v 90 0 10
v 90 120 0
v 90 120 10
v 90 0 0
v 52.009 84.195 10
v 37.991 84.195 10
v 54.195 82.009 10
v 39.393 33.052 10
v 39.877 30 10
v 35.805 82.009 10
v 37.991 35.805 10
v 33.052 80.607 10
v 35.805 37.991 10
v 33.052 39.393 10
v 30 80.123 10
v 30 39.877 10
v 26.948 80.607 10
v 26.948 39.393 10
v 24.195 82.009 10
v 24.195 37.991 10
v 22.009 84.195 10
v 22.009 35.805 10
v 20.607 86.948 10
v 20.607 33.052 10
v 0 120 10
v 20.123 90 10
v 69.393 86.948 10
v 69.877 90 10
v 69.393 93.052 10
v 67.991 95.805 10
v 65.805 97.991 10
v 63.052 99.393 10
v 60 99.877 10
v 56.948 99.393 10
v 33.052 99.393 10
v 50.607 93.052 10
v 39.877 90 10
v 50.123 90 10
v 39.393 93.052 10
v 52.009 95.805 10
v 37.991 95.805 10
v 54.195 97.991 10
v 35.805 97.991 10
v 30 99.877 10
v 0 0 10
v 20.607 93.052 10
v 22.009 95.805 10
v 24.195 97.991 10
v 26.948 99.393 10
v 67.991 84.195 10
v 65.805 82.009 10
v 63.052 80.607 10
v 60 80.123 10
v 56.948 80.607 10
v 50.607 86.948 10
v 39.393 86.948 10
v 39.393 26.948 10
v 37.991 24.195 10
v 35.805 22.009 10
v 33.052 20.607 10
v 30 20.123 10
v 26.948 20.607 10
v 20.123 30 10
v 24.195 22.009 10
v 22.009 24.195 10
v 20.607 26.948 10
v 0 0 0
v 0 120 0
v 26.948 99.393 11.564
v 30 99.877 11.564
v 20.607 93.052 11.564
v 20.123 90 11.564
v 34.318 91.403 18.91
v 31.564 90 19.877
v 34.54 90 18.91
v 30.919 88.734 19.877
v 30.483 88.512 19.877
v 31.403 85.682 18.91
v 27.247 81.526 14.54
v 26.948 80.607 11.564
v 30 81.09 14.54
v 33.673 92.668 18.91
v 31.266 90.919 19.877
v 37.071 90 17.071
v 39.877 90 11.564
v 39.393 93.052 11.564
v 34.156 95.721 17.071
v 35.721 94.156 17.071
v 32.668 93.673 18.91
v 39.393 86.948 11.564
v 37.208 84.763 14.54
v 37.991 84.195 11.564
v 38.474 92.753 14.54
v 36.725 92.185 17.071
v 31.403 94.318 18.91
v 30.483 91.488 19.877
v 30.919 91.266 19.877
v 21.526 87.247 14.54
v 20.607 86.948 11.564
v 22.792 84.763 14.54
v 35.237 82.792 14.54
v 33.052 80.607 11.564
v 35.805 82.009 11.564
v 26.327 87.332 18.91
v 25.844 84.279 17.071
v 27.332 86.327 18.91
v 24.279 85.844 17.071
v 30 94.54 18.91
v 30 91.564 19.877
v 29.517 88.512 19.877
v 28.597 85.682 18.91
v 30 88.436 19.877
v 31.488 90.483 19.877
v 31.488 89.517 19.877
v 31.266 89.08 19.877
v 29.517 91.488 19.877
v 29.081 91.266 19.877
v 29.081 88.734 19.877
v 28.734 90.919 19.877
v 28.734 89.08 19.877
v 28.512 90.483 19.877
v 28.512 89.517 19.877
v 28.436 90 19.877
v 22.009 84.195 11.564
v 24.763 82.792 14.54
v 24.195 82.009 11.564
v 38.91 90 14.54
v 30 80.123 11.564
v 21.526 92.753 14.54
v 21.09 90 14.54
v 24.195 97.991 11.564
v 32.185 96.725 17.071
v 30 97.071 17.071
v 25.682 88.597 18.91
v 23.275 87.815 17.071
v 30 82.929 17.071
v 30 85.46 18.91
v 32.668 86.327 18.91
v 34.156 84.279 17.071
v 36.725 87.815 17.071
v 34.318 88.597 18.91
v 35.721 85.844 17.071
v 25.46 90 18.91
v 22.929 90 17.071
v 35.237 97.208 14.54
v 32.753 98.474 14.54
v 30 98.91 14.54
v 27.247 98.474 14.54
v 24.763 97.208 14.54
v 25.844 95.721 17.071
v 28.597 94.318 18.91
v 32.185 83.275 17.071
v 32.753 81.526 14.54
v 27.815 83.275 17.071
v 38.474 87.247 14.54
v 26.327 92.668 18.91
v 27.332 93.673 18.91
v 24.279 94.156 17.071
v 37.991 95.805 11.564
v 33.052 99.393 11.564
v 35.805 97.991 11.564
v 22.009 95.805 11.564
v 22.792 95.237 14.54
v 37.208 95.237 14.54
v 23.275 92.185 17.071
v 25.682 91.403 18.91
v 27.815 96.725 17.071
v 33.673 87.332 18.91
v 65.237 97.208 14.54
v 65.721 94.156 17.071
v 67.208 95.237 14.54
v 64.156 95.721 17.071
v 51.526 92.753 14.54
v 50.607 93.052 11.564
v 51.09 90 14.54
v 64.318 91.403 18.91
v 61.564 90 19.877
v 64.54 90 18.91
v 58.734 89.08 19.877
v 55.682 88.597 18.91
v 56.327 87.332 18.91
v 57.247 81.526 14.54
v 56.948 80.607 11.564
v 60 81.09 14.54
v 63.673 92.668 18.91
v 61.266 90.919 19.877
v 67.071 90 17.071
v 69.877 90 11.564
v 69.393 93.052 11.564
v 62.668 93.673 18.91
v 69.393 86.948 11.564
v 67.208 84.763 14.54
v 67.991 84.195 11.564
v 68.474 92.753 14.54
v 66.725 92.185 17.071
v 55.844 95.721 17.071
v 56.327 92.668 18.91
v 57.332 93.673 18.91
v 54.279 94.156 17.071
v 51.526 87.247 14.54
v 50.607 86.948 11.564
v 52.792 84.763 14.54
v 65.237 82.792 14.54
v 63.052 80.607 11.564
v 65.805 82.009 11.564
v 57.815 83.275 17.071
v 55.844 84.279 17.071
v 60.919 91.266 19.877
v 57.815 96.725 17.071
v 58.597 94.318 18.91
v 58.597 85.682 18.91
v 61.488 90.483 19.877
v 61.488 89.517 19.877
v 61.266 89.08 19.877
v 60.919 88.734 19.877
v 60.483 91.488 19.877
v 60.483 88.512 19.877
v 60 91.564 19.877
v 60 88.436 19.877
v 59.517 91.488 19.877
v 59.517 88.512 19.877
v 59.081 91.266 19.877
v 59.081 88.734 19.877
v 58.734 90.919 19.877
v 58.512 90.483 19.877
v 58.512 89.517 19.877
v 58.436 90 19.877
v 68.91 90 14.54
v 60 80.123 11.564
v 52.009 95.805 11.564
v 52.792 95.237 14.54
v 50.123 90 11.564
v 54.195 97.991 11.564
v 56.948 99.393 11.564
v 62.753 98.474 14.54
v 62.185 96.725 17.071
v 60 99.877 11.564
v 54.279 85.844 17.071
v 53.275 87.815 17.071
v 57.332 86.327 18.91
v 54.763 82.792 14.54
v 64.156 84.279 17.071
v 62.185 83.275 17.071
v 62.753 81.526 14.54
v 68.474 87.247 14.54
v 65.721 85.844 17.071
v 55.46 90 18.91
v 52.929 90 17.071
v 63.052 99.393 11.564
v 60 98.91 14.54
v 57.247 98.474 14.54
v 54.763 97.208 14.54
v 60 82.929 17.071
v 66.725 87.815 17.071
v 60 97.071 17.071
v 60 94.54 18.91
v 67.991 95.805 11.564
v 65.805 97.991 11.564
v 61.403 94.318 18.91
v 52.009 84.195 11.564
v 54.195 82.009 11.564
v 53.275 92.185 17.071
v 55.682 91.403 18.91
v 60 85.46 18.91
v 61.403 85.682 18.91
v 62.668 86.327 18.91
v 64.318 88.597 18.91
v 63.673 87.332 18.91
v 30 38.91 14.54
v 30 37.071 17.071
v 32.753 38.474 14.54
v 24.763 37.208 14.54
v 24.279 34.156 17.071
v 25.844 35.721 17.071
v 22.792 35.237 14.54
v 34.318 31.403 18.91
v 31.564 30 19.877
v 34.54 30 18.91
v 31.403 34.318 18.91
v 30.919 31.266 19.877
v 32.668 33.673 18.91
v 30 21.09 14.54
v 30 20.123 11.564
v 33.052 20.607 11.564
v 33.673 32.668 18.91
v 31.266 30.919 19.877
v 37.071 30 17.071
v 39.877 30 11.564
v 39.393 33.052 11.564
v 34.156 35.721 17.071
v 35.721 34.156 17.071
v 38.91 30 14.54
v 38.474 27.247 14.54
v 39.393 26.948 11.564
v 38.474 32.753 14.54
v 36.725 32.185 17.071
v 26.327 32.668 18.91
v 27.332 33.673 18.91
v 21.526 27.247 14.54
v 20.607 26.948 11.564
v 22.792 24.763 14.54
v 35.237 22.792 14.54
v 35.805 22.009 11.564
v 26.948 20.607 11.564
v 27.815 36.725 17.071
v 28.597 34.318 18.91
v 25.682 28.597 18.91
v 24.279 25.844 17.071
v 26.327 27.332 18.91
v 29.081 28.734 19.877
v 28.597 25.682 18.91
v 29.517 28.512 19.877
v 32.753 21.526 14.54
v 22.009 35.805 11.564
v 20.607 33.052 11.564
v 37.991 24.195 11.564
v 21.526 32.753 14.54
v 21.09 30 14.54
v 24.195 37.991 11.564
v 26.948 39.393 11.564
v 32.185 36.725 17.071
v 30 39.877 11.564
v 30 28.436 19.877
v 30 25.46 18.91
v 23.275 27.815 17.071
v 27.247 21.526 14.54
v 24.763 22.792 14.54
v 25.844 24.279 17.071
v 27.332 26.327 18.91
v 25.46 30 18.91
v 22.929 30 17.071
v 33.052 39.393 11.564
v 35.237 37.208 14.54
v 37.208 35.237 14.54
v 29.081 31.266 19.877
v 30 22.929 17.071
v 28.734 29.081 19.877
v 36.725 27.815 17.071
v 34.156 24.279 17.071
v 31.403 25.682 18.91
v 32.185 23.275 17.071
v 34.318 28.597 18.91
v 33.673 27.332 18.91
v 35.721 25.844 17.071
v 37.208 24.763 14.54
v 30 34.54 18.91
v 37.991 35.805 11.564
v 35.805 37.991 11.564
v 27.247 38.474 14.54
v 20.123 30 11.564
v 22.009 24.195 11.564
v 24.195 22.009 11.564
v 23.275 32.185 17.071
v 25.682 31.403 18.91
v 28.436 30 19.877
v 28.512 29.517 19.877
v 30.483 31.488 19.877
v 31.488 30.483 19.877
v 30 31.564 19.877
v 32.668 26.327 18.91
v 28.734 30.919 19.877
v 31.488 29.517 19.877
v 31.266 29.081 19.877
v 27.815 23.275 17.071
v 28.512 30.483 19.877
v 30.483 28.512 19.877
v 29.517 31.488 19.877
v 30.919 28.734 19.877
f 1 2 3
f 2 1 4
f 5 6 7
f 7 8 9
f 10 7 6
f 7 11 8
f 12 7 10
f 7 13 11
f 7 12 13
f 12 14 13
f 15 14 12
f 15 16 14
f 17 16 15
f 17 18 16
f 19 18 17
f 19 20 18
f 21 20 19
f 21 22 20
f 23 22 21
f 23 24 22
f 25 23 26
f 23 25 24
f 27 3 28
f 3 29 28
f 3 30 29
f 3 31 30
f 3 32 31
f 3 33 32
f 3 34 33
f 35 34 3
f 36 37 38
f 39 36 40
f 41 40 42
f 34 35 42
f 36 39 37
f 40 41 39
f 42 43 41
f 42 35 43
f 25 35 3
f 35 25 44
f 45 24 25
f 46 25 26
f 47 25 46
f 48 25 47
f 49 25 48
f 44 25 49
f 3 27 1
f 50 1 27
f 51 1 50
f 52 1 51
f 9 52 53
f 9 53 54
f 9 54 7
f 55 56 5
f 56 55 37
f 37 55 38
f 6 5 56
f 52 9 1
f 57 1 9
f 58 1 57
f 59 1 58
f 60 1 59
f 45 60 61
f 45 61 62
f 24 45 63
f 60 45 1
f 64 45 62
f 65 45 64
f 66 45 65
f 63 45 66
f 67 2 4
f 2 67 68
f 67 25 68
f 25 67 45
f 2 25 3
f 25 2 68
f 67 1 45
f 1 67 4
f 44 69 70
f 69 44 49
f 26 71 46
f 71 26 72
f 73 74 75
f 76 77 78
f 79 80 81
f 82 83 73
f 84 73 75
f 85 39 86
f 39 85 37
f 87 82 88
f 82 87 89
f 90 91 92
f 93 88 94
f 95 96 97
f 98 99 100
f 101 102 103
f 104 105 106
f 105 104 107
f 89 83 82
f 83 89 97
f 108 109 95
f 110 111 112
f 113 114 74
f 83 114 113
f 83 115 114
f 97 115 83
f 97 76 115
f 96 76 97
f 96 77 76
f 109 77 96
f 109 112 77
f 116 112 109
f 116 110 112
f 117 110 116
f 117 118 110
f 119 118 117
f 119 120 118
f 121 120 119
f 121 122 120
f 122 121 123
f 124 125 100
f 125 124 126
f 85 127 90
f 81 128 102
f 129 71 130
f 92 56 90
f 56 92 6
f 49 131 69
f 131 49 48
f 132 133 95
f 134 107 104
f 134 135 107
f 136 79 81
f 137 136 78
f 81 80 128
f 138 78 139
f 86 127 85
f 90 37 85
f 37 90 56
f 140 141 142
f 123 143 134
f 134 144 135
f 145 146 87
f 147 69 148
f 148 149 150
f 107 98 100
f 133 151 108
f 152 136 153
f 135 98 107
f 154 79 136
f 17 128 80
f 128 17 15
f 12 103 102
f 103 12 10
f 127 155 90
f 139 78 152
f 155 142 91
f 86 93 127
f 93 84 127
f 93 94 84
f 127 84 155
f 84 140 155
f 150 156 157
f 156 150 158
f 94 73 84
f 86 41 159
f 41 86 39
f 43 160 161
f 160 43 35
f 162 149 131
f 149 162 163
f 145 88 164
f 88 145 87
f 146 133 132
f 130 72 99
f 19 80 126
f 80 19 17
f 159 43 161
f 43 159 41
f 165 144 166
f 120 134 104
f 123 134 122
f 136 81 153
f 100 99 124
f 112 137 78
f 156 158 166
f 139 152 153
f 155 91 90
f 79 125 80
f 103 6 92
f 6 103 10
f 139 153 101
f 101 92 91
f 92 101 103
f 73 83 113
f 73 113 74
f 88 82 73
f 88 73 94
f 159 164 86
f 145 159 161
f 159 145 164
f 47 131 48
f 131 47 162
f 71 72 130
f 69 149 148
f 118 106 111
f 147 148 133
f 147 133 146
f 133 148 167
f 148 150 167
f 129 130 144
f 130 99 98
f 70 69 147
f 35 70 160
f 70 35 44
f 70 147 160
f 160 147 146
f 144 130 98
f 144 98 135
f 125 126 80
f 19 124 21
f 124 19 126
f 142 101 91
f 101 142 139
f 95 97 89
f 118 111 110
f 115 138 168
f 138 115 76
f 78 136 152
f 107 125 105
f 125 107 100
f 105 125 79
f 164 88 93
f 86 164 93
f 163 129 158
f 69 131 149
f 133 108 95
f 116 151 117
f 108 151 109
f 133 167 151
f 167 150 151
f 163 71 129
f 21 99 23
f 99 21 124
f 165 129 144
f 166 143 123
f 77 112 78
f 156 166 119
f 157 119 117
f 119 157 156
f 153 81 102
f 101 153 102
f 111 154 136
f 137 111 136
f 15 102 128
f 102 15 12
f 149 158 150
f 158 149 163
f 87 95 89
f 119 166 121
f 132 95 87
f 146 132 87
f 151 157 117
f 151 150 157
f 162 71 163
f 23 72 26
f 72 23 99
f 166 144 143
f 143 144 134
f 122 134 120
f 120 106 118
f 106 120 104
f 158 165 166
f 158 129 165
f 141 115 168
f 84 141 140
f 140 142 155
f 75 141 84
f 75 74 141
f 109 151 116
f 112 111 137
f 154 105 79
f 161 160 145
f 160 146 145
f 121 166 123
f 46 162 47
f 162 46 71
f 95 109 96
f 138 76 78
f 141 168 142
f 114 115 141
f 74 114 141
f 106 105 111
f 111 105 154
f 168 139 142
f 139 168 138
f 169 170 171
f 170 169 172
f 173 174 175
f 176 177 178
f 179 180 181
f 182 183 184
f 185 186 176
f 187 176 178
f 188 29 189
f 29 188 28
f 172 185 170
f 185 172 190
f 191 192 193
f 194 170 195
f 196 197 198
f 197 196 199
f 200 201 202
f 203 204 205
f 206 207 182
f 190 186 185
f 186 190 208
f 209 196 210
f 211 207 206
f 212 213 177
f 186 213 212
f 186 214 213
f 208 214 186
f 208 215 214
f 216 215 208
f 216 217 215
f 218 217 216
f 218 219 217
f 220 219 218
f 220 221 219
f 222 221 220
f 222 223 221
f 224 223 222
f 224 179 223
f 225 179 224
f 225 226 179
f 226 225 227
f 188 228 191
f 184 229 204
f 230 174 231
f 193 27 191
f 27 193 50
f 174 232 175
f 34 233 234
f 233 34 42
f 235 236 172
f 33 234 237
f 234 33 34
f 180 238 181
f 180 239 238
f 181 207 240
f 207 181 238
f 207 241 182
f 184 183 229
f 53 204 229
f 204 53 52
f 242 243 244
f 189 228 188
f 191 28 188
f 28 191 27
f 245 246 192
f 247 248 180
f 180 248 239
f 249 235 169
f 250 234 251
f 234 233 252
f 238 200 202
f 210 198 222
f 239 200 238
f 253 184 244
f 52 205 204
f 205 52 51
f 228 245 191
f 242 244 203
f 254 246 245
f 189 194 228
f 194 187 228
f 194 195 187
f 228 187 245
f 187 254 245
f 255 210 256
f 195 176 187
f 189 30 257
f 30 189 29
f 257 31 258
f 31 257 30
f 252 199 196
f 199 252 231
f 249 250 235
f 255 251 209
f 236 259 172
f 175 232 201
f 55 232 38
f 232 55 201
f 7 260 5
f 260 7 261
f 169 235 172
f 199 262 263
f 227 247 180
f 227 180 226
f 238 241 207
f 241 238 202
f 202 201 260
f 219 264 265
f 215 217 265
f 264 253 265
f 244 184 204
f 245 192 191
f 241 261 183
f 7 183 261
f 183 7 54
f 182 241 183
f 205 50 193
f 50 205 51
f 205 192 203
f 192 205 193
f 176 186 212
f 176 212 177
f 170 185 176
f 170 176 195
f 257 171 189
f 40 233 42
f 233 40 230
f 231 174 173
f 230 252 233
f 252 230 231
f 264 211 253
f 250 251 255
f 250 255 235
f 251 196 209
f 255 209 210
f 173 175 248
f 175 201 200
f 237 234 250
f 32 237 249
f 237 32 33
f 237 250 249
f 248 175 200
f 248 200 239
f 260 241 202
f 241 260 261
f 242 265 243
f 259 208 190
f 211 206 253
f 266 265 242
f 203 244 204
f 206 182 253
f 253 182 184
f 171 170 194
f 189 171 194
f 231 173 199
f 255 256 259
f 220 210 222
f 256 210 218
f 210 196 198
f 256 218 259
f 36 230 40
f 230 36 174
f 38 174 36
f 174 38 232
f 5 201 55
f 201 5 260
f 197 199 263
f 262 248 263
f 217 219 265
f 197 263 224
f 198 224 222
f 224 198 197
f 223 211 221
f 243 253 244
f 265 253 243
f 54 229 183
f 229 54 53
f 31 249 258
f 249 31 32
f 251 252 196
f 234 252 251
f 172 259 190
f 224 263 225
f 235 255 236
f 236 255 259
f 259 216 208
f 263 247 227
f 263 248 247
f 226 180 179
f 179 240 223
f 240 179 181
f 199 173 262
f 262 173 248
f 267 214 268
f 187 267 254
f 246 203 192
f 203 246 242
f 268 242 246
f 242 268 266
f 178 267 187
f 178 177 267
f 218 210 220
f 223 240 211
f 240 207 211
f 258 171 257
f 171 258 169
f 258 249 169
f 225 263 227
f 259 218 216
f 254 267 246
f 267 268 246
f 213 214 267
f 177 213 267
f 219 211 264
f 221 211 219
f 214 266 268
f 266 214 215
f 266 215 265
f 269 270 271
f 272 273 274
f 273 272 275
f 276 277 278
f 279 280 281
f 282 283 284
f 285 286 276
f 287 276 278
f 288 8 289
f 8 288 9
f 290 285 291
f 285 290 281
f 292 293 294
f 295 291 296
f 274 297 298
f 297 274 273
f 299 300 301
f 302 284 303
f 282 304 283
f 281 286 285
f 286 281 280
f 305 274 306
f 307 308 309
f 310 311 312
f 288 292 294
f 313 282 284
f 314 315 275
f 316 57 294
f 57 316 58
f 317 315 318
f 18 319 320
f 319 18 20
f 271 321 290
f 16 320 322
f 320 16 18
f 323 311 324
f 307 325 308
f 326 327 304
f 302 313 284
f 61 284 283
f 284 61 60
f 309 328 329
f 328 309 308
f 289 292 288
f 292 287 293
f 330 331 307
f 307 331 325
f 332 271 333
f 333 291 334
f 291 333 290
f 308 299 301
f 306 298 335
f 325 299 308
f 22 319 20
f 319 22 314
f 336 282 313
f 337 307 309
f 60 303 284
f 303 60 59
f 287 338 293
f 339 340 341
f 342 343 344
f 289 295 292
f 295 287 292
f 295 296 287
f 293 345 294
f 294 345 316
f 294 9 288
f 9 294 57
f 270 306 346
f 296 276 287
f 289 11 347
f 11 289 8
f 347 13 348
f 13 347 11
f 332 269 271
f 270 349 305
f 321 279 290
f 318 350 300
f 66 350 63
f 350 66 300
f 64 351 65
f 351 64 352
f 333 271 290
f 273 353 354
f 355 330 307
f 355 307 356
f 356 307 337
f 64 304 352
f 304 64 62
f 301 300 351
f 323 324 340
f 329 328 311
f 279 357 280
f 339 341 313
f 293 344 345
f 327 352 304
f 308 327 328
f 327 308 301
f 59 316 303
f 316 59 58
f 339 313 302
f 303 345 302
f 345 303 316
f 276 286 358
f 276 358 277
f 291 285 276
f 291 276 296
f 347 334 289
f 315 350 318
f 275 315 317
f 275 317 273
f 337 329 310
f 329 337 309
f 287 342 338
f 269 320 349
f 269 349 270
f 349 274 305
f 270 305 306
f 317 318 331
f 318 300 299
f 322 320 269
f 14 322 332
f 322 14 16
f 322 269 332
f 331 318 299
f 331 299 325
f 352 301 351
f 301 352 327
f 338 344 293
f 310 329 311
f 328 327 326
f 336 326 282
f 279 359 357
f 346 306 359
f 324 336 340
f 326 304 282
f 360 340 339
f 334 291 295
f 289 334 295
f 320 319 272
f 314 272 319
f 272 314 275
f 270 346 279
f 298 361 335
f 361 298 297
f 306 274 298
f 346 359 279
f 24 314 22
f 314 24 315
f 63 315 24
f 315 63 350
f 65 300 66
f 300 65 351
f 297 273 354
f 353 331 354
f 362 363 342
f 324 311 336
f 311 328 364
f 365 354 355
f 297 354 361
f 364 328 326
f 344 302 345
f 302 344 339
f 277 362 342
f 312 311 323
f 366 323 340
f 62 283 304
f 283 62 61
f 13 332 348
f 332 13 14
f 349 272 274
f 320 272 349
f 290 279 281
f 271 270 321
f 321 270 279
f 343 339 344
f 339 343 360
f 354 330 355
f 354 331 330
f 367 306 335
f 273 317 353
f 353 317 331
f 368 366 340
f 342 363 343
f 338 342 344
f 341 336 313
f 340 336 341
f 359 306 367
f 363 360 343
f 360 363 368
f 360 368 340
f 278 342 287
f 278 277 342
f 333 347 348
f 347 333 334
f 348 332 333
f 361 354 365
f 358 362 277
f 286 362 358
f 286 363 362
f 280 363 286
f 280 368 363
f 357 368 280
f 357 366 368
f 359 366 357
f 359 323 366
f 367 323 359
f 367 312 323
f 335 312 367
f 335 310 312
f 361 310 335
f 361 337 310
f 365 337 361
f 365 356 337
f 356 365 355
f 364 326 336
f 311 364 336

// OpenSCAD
nbr_letras = 1;

nbr1 = 1;
nbr2 = 1;
nbr3 = 0;
nbr4 = 0;
nbr5 = 1;
nbr6 = 0;


//base
cube([90, 120, 10]);
//1
if ( nbr1 == 1){
translate([30, 90, 10])
sphere(r = 10, $fn= 20);
}

//2
if ( nbr2 == 1){
translate([60, 90, 10])
sphere(r = 10, $fn= 20);
}

//3
if ( nbr3 == 1){
translate([30, 60, 10])
sphere(r = 10, $fn= 20);
}

//4
if ( nbr4 == 1){
translate([60, 60, 10])
sphere(r = 10, $fn= 20);
}

//5
if ( nbr5 == 1){
translate([30, 30, 10])
sphere(r = 10, $fn= 20);
}

//6
if ( nbr6 == 1){
translate([60, 30, 10])
sphere(r = 10, $fn= 20);
}
